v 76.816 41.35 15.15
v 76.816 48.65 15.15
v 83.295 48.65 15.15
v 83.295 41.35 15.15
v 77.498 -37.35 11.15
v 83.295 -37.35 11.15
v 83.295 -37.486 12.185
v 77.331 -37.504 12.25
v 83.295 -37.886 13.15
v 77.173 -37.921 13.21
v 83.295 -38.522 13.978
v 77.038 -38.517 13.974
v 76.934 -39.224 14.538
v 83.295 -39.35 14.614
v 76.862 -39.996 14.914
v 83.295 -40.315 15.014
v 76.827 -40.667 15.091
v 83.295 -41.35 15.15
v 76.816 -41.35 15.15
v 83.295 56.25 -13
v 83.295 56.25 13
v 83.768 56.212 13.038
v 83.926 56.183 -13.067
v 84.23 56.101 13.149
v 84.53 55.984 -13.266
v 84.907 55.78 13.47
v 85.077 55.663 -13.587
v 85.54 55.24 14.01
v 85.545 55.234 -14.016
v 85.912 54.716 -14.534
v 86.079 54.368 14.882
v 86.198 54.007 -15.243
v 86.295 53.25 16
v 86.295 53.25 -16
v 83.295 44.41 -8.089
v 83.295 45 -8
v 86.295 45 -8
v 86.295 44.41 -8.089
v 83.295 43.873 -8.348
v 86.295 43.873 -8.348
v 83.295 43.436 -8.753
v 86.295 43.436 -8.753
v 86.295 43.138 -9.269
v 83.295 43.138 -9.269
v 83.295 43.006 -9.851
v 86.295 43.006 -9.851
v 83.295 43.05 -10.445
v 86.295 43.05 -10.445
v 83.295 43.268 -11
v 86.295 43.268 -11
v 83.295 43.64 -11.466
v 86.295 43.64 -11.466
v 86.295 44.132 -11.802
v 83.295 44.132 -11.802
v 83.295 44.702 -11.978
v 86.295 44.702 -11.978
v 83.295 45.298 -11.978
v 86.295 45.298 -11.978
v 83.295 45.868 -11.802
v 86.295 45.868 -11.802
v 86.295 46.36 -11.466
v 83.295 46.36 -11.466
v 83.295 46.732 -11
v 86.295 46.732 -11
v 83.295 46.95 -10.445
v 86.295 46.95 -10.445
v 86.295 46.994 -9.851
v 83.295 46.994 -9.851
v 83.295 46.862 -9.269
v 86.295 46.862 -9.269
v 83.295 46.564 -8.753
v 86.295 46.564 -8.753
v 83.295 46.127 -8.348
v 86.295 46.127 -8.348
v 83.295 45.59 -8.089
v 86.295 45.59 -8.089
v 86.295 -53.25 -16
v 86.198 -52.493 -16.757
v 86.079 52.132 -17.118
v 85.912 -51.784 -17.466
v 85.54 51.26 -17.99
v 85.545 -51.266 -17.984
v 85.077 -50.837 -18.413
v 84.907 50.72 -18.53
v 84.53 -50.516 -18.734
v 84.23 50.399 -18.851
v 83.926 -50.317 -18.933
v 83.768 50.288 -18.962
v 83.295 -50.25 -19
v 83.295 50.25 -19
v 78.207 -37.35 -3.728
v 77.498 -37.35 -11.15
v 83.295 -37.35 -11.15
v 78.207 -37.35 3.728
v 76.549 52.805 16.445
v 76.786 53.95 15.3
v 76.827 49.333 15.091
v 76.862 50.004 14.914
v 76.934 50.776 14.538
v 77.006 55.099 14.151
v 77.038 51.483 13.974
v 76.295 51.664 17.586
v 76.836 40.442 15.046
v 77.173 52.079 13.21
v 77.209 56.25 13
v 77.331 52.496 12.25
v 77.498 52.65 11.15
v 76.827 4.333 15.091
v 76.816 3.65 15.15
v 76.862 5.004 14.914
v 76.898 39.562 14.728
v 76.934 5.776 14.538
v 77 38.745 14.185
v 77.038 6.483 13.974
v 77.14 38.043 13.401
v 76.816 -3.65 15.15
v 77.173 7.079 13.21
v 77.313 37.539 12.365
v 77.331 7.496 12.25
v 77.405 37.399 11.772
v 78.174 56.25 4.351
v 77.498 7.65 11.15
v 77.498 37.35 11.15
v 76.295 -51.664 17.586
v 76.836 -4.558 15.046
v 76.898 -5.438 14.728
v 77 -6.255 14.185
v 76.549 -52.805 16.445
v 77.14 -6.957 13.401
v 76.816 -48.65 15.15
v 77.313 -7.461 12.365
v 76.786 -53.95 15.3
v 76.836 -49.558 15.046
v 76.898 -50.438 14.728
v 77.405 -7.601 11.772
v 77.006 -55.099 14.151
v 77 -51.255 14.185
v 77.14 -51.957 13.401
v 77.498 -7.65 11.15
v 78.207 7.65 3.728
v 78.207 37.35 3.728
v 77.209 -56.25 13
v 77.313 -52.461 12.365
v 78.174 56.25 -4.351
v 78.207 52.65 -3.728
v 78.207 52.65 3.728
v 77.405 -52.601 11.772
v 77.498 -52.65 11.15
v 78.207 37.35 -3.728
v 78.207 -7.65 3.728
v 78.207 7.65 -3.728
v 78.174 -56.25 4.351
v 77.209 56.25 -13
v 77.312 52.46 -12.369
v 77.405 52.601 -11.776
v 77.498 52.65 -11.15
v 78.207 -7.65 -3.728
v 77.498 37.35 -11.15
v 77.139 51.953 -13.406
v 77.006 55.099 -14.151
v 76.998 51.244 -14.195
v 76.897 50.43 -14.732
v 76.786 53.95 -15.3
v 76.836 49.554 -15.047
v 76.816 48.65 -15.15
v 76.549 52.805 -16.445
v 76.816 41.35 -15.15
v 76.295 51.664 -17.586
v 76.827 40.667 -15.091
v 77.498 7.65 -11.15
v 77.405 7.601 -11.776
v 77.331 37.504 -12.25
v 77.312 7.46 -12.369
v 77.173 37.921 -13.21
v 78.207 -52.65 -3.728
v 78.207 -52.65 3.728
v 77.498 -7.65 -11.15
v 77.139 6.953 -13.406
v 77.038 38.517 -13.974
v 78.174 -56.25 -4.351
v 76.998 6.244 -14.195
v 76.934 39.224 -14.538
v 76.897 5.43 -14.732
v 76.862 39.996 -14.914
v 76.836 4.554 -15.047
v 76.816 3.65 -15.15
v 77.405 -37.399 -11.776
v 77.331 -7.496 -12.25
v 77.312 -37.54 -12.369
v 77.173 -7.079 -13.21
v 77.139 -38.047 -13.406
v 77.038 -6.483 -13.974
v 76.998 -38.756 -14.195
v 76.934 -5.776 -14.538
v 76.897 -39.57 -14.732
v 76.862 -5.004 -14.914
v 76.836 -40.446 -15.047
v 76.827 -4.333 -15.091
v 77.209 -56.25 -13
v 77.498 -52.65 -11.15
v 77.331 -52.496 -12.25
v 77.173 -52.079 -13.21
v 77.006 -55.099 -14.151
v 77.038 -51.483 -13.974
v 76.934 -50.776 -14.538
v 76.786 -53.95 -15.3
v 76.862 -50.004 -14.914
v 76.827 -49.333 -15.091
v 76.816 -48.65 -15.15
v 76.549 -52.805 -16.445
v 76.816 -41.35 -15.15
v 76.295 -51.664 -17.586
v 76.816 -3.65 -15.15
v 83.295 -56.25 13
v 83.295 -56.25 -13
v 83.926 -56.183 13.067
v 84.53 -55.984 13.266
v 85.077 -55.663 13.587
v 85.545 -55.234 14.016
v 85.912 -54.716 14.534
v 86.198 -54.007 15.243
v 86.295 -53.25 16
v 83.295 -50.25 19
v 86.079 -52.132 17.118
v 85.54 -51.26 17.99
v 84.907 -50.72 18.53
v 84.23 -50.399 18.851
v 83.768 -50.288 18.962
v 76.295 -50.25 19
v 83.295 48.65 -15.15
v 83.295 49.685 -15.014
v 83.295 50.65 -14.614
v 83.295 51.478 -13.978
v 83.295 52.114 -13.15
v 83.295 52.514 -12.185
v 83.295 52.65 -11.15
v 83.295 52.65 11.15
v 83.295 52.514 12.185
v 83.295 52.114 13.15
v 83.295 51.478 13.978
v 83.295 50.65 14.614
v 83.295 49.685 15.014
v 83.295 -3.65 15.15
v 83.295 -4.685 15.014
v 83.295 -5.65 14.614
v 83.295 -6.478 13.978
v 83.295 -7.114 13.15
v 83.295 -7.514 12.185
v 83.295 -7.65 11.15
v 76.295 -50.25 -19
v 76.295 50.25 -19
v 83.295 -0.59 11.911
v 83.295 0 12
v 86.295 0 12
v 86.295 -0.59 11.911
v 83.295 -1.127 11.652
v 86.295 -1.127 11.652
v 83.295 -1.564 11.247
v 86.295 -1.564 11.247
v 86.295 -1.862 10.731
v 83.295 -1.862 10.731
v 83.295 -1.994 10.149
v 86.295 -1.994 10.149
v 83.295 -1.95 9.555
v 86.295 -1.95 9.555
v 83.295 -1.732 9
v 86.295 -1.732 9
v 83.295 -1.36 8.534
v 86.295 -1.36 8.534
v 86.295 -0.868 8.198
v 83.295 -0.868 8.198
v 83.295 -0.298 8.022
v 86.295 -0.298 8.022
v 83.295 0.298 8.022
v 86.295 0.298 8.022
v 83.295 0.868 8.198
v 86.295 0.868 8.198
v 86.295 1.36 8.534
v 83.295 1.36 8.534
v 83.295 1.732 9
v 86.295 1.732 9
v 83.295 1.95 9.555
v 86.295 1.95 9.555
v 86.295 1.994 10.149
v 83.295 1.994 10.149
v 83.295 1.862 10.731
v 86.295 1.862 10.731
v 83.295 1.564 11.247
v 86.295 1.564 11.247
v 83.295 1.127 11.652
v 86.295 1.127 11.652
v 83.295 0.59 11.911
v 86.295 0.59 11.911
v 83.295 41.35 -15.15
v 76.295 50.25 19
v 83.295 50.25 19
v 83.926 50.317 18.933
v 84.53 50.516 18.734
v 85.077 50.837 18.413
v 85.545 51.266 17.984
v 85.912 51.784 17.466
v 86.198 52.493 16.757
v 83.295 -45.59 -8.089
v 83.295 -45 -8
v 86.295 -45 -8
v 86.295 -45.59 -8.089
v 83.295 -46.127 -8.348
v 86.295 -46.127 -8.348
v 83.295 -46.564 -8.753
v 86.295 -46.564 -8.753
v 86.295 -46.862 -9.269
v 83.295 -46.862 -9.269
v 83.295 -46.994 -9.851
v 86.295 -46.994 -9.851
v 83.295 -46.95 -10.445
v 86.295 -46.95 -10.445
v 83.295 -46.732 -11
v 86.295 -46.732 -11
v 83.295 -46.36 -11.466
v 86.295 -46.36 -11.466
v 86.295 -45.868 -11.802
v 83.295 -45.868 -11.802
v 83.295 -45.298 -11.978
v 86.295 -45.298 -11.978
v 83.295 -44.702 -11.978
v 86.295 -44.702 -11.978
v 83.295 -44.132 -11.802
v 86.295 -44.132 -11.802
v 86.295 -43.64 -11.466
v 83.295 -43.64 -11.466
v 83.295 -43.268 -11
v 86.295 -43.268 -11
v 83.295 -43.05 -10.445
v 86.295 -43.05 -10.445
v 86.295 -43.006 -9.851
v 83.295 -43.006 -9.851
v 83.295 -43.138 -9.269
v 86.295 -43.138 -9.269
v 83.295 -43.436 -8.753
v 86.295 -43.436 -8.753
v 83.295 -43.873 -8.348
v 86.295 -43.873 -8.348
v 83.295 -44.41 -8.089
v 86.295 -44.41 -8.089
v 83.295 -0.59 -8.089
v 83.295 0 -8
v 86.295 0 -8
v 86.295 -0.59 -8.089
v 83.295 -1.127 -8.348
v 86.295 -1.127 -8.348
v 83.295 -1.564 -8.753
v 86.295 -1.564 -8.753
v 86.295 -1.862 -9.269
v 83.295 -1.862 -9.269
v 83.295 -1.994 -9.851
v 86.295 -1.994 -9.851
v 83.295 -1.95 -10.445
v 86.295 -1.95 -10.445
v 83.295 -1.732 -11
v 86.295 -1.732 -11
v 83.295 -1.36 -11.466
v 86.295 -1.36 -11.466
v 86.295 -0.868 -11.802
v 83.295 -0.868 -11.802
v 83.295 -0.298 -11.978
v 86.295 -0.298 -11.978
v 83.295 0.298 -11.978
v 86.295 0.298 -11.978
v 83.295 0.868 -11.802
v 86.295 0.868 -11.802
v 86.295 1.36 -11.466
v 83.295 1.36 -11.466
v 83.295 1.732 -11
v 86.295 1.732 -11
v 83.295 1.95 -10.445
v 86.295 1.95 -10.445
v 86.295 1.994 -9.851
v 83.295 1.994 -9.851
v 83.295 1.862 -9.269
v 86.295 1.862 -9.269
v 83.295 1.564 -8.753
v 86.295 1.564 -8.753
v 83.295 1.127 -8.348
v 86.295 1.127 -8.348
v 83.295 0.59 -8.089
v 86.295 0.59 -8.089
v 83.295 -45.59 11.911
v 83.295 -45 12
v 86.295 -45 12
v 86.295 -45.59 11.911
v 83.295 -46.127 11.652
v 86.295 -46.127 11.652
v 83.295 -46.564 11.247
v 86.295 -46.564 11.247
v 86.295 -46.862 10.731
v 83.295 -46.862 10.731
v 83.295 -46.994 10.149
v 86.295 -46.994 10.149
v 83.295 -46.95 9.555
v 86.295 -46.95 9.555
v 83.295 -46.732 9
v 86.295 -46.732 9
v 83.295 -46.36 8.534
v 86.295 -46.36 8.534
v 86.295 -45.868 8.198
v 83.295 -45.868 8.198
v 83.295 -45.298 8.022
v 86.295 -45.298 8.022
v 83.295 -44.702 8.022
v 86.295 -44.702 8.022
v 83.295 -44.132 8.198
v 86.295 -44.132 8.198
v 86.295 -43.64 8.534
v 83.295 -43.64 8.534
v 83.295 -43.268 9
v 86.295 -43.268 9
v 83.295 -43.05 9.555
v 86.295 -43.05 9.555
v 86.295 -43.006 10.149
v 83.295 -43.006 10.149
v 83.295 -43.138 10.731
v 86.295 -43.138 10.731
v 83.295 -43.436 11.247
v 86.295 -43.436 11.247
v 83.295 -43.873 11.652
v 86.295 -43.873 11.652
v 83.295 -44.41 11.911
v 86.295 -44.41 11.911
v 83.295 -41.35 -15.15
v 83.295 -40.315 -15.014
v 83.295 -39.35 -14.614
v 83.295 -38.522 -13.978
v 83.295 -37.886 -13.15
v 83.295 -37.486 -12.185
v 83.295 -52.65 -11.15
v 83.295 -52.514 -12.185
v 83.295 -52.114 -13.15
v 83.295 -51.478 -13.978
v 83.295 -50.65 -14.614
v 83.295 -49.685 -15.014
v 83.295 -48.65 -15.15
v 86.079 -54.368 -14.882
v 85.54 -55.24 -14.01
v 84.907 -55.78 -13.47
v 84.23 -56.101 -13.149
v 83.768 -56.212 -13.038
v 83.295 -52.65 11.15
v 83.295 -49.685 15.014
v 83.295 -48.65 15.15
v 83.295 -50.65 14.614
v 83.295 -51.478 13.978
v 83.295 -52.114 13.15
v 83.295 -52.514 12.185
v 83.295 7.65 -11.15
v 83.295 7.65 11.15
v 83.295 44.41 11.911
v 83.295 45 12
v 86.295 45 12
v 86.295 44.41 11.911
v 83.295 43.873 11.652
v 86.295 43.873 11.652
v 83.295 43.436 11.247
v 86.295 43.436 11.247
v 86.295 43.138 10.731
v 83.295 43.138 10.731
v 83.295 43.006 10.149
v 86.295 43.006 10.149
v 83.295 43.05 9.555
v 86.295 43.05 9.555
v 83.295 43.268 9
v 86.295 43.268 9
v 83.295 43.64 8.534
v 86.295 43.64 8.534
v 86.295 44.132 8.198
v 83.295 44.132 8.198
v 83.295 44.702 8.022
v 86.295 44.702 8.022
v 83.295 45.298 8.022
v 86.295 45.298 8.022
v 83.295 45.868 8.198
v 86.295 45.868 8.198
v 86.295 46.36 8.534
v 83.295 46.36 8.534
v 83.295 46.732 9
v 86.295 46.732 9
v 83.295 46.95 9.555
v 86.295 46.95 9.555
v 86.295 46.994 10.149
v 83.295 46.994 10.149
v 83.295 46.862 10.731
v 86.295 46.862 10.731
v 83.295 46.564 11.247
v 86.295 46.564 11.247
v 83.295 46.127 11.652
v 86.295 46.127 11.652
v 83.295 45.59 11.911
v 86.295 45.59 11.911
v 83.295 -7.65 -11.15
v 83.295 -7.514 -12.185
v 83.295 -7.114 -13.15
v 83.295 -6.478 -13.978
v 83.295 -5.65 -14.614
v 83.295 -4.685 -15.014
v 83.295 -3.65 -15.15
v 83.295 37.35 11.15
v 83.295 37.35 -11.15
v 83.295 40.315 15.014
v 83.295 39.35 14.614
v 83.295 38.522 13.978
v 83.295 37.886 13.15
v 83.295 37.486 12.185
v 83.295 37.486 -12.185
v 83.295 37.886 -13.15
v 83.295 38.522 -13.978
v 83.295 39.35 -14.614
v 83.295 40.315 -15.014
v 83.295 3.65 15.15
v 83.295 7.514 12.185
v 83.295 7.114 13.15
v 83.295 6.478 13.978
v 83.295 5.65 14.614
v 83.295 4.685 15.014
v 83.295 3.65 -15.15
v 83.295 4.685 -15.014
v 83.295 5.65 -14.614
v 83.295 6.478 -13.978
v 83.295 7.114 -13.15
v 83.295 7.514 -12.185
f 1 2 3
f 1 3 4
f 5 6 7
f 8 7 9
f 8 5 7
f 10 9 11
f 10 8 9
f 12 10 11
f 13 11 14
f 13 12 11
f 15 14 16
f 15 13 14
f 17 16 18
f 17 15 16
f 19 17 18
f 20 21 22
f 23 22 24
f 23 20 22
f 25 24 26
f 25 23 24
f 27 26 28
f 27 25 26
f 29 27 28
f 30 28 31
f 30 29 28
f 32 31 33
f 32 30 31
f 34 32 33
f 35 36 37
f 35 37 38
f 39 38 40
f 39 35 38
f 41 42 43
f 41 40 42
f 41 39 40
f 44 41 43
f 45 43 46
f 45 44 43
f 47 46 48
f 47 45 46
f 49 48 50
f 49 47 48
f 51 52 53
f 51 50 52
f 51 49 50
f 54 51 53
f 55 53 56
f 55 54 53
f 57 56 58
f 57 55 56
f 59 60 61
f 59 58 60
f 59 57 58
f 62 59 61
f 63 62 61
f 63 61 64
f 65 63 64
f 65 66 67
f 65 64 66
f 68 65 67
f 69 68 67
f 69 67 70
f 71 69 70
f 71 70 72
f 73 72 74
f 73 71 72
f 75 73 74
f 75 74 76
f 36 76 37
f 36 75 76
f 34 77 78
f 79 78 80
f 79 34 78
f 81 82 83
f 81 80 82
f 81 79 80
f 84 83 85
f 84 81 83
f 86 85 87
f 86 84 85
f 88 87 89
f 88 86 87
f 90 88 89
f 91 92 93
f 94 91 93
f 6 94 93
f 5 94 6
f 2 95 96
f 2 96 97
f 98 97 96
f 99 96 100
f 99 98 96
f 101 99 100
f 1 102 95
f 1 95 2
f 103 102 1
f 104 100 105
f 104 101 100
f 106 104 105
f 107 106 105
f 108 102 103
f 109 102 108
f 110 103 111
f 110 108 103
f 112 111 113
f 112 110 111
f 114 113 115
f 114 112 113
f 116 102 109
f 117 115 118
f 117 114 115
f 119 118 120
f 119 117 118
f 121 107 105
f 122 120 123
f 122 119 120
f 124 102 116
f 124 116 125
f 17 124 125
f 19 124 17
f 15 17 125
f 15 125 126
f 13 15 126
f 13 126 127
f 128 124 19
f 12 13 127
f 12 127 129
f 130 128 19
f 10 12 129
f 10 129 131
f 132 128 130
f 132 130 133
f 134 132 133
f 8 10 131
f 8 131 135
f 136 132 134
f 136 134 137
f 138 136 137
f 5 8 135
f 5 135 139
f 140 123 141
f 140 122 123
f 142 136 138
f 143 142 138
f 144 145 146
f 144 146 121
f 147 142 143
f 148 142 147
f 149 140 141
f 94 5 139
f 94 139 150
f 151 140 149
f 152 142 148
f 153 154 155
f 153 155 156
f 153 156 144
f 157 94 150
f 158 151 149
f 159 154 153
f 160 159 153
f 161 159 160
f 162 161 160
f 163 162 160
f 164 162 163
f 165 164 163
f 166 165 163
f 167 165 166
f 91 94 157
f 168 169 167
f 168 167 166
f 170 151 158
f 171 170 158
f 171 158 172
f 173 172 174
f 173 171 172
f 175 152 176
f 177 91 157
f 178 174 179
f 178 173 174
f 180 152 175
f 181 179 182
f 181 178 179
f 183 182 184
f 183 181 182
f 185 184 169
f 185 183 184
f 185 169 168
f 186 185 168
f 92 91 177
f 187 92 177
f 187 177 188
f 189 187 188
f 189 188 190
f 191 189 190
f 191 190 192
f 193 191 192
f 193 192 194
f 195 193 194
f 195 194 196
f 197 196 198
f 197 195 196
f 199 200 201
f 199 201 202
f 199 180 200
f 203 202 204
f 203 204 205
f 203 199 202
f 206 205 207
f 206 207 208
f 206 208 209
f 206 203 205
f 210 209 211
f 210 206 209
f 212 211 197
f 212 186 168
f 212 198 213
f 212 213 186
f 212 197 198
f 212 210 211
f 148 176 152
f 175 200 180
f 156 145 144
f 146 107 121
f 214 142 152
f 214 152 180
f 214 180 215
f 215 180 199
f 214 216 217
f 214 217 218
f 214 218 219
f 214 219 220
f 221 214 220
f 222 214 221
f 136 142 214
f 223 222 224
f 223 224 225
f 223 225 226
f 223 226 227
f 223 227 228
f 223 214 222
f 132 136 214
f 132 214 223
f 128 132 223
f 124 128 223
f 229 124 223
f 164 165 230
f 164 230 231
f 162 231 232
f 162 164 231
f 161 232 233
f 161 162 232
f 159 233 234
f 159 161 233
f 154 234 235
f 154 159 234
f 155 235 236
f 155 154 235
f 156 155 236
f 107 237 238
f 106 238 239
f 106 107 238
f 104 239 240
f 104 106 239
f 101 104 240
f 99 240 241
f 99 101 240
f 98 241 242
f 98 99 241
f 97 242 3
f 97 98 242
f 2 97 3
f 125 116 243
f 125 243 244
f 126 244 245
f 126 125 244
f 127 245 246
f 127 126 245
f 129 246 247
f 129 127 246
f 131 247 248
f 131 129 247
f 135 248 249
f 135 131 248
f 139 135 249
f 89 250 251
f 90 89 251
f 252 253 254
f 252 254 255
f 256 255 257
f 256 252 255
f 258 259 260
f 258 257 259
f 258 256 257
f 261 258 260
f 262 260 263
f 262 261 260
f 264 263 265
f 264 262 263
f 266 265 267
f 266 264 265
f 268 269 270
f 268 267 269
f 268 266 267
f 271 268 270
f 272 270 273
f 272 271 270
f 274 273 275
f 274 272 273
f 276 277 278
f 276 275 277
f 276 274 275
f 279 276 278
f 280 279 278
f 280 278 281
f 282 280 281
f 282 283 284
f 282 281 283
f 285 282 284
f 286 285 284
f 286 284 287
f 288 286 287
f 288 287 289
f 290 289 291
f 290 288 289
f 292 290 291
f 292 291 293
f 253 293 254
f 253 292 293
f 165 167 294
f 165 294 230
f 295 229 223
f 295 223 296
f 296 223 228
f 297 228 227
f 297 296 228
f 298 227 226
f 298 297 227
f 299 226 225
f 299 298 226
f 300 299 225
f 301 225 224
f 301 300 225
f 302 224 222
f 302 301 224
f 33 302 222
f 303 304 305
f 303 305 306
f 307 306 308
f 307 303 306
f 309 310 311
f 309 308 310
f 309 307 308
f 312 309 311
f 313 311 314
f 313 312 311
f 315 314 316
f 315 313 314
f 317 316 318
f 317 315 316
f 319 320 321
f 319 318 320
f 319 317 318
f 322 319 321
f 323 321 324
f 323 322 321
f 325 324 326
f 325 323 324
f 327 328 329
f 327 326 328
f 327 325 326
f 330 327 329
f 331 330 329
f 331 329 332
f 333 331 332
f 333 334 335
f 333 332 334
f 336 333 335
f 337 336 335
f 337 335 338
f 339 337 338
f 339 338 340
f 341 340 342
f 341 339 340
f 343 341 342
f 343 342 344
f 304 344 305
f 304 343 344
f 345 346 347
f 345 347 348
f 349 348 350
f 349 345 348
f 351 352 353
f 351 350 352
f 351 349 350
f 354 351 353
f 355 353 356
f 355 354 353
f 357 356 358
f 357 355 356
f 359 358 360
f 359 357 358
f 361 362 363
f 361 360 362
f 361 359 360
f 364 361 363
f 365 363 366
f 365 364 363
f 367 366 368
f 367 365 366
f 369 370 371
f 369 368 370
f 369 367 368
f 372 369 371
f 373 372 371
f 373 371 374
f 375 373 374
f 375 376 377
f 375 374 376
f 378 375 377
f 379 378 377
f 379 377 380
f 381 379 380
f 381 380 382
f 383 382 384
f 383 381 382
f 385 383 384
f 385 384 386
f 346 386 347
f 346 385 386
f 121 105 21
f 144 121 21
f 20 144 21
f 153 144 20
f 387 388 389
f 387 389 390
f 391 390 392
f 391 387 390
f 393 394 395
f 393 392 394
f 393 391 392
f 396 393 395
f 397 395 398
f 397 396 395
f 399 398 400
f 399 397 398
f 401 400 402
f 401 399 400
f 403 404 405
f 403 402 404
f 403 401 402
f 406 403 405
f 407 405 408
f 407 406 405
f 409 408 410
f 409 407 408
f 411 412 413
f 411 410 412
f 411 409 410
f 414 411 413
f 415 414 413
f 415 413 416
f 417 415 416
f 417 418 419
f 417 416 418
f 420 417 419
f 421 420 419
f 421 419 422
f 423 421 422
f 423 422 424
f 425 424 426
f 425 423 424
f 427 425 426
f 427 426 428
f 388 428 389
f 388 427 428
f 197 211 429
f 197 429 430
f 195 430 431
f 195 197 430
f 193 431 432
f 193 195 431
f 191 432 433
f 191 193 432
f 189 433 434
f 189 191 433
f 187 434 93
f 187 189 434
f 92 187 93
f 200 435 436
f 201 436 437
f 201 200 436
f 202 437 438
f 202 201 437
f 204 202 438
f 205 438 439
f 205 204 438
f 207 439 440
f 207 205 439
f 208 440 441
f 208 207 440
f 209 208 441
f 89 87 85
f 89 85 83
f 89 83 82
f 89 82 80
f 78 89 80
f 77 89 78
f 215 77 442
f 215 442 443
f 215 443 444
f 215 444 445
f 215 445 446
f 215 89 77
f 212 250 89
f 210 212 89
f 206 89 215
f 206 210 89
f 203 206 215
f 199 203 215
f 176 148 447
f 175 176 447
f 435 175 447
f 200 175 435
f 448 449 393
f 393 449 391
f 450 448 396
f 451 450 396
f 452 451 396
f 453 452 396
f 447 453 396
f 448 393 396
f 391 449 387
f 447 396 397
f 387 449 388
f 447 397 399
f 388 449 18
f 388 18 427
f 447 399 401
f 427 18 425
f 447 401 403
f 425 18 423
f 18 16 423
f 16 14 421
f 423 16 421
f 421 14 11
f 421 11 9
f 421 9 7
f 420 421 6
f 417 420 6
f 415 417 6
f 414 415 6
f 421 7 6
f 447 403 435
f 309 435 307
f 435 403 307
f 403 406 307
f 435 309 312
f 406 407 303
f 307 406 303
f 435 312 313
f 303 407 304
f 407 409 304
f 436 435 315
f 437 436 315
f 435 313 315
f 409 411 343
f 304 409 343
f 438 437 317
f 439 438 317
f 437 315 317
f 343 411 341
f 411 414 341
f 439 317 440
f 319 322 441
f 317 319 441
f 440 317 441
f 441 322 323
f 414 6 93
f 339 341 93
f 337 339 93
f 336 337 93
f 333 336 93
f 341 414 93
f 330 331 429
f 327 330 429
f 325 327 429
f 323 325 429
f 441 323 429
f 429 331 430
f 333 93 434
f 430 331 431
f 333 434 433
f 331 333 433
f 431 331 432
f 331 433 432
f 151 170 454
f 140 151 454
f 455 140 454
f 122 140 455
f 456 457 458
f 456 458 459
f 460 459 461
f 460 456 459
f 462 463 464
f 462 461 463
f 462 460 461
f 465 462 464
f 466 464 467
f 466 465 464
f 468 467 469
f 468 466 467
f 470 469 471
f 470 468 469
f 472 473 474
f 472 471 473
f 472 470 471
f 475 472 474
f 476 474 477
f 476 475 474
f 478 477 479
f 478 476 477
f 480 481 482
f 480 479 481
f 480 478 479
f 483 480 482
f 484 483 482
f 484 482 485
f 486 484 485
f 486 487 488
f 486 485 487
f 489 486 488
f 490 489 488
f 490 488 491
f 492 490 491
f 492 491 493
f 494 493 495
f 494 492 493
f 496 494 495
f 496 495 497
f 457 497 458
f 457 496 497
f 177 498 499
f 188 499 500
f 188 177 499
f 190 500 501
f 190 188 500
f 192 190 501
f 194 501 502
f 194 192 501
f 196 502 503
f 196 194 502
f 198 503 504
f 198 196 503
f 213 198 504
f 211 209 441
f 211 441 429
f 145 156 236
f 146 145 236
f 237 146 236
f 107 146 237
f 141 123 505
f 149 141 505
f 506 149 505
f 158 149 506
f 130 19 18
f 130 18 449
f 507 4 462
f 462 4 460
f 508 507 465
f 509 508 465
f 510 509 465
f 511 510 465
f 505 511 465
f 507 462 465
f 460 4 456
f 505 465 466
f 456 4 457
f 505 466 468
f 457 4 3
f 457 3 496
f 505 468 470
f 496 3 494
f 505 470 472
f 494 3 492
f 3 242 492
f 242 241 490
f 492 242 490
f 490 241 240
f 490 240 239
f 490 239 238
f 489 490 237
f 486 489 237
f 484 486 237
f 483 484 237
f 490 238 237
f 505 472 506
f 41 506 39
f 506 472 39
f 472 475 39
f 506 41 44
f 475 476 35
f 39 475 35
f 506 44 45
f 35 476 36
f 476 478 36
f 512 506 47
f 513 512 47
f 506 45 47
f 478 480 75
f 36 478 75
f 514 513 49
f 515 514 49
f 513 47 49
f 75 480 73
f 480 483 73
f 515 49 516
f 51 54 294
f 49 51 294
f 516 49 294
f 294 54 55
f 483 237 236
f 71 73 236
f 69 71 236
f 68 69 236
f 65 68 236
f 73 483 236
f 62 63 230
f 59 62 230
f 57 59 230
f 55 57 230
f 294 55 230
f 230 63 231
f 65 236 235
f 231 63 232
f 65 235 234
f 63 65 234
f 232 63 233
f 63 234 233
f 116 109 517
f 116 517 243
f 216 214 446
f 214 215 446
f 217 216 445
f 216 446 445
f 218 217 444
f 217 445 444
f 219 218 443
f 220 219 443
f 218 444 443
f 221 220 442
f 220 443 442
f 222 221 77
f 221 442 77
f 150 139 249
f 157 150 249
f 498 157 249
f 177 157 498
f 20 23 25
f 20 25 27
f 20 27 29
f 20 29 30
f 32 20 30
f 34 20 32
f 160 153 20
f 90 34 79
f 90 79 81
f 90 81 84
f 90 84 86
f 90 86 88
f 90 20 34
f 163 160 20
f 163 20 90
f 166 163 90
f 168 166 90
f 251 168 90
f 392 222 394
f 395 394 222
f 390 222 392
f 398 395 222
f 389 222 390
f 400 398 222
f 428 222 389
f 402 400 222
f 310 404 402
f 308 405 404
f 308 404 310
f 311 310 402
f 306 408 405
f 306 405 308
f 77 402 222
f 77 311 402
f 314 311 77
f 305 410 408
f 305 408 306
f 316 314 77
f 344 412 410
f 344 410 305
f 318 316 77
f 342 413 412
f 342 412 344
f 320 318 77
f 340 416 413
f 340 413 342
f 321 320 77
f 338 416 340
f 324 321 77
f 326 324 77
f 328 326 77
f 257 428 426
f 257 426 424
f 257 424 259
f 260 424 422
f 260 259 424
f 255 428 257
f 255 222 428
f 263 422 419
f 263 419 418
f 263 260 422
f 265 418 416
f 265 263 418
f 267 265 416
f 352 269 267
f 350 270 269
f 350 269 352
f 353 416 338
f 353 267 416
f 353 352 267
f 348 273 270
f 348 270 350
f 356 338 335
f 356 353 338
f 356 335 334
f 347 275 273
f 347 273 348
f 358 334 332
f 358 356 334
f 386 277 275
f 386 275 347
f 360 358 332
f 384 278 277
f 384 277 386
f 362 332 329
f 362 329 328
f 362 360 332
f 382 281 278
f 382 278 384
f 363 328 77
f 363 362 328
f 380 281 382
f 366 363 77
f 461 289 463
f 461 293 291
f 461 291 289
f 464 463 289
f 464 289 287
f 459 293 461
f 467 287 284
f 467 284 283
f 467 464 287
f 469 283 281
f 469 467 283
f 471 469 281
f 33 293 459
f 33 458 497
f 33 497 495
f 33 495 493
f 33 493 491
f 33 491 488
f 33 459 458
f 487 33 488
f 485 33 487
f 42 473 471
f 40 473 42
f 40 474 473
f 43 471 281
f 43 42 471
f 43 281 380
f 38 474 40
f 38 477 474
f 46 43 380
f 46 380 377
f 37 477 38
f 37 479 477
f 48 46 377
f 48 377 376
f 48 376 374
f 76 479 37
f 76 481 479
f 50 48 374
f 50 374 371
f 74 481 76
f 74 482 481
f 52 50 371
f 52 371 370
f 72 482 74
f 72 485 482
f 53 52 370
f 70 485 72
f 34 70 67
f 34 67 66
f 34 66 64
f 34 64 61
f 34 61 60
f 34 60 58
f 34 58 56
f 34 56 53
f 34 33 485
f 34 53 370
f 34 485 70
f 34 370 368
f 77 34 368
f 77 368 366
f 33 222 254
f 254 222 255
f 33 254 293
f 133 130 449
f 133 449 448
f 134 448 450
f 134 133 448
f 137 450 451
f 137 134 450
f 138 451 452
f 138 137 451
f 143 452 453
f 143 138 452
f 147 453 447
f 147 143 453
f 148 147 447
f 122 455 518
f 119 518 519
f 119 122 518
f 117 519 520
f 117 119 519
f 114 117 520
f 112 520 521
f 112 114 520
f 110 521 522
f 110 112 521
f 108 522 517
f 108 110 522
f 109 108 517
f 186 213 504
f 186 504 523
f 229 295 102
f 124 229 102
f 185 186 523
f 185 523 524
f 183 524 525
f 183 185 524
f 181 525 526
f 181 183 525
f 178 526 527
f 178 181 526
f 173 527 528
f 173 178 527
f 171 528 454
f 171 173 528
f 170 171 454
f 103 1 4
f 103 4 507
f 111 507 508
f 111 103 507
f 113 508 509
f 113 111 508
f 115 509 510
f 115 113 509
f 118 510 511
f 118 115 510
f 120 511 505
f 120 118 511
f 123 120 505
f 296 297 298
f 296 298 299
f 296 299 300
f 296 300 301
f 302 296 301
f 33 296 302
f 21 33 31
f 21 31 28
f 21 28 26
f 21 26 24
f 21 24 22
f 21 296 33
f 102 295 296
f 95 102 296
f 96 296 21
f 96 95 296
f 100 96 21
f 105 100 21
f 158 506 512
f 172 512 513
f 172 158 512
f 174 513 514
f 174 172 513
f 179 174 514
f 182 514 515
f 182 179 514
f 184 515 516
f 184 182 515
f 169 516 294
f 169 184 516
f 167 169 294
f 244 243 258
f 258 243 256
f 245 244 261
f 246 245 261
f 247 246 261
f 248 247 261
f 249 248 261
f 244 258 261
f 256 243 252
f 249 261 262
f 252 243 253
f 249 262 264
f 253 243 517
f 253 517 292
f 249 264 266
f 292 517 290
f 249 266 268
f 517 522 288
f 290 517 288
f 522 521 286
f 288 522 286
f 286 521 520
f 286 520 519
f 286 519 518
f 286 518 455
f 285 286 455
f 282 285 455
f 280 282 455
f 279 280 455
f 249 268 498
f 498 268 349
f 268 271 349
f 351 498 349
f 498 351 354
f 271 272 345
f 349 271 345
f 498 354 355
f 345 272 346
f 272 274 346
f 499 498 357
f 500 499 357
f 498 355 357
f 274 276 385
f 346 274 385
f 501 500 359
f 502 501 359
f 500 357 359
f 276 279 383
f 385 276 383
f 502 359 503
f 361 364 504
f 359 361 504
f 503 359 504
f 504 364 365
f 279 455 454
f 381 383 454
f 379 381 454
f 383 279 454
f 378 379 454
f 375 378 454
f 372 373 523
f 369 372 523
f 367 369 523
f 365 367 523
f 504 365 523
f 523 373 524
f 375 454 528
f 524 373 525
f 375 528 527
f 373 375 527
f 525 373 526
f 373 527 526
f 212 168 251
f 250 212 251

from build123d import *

# Parameters (mm, degrees)
BOSS_EXTRUDE1_DEPTH      = 8
BOSS_EXTRUDE1_DEPTH_BACK = 2
SKETCH2_W                = 38
SKETCH2_H                = 112.5
CUT_EXTRUDE1_START       = -2
CUT_EXTRUDE1_DEPTH       = 7
SKETCH3_3_R              = 2
CUT_EXTRUDE2_DEPTH       = 60.908784832
LPATTERN1_COUNT          = 2
LPATTERN1_PITCH          = 45
LPATTERN1_COL_COUNT      = 2
LPATTERN1_COL_PITCH      = 45
FILLET1_R                = 3
CHAMFER1_START           = 75
CHAMFER1_DEPTH           = 12
CUT_EXTRUDE3_DEPTH       = 105.74678766
CUT_EXTRUDE3_DEPTH_BACK  = 105.74678766
SKETCH1_R                = 78.2955


with BuildPart() as part:
    # Sketch2 → Boss-Extrude1 (new, two sides: drawn at the far end of the back side and taken through both)
    with BuildSketch(Plane(origin=(78.295, 0, 0), x_dir=(0, 0, -1), z_dir=(1, 0, 0)).offset(-BOSS_EXTRUDE1_DEPTH_BACK)):
        Rectangle(SKETCH2_W, SKETCH2_H)
    extrude(amount=BOSS_EXTRUDE1_DEPTH + BOSS_EXTRUDE1_DEPTH_BACK)

    # Sketch3 → Cut-Extrude1 (cut)
    with BuildSketch(Plane(origin=(78.295, 0, 0), x_dir=(0, 0, -1), z_dir=(1, 0, 0)).offset(CUT_EXTRUDE1_START)):
        with BuildLine():
            Line((-11.15, -7.65), (11.15, -7.65))
            ThreePointArc((11.15, -7.65), (13.978427125, -6.478427125), (15.15, -3.65))
            Line((15.15, -3.65), (15.15, 3.65))
            ThreePointArc((15.15, 3.65), (13.978427125, 6.478427125), (11.15, 7.65))
            Line((11.15, 7.65), (-11.15, 7.65))
            ThreePointArc((-11.15, 7.65), (-13.978427125, 6.478427125), (-15.15, 3.65))
            Line((-15.15, 3.65), (-15.15, -3.65))
            ThreePointArc((-15.15, -3.65), (-13.978427125, -6.478427125), (-11.15, -7.65))
        make_face()
    cut_extrude1 = extrude(amount=CUT_EXTRUDE1_DEPTH, mode=Mode.SUBTRACT)

    # Sketch3<3> → Cut-Extrude2 (cut, through all)
    with BuildSketch(Plane(origin=(78.295, 0, 0), x_dir=(0, 0, -1), z_dir=(1, 0, 0))):
        with Locations(Location((-10, 0, 0), (0, 0, 180))):
            Circle(SKETCH3_3_R)
        with Locations(Location((10, 0, 0), (0, 0, 180))):
            Circle(SKETCH3_3_R)
    cut_extrude2 = extrude(amount=CUT_EXTRUDE2_DEPTH, mode=Mode.SUBTRACT)

    # LPattern1: Cut-Extrude1, Cut-Extrude2 ×2
    with Locations(*[(0, -i * LPATTERN1_PITCH, 0) for i in range(1, LPATTERN1_COUNT)]):
        add(cut_extrude1, mode=Mode.SUBTRACT)
        add(cut_extrude2, mode=Mode.SUBTRACT)

    # LPattern1 col: Cut-Extrude1, Cut-Extrude2 ×2
    with Locations(*[(0, i * LPATTERN1_COL_PITCH, 0) for i in range(1, LPATTERN1_COL_COUNT)]):
        add(cut_extrude1, mode=Mode.SUBTRACT)
        add(cut_extrude2, mode=Mode.SUBTRACT)

    # Fillet1
    fillet1_edges = [part.edges().sort_by_distance(p)[0] for p in [
        (86.295, 0, -19),
        (86.295, 56.25, 0),
        (86.295, 0, 19),
        (86.295, -56.25, 0),
    ]]
    fillet(fillet1_edges, radius=FILLET1_R)

    # Chamfer1: read off the stored shape, not the designer's step
    # Chamfer1 outline → Chamfer1 (cut)
    with BuildSketch(Plane.YZ.offset(CHAMFER1_START)):
        Polygon((-56.25, 19), (-56.25, 13), (-50.25, 19), align=None)
        Polygon((-50.25, -19), (-56.25, -13), (-56.25, -19), align=None)
        Polygon((56.25, 19), (50.25, 19), (56.25, 13), align=None)
        Polygon((56.25, -13), (50.25, -19), (56.25, -19), align=None)
    extrude(amount=CHAMFER1_DEPTH, mode=Mode.SUBTRACT)

    # Sketch1 → Cut-Extrude3 (cut, two sides: drawn at the far end of the back side and taken through both)
    with BuildSketch(Plane(origin=(0, 0, 0), x_dir=(1, 0, 0), z_dir=(0, 1, 0)).offset(-CUT_EXTRUDE3_DEPTH_BACK)):
        Circle(SKETCH1_R)
    extrude(amount=CUT_EXTRUDE3_DEPTH + CUT_EXTRUDE3_DEPTH_BACK, mode=Mode.SUBTRACT)


solid = part.part
